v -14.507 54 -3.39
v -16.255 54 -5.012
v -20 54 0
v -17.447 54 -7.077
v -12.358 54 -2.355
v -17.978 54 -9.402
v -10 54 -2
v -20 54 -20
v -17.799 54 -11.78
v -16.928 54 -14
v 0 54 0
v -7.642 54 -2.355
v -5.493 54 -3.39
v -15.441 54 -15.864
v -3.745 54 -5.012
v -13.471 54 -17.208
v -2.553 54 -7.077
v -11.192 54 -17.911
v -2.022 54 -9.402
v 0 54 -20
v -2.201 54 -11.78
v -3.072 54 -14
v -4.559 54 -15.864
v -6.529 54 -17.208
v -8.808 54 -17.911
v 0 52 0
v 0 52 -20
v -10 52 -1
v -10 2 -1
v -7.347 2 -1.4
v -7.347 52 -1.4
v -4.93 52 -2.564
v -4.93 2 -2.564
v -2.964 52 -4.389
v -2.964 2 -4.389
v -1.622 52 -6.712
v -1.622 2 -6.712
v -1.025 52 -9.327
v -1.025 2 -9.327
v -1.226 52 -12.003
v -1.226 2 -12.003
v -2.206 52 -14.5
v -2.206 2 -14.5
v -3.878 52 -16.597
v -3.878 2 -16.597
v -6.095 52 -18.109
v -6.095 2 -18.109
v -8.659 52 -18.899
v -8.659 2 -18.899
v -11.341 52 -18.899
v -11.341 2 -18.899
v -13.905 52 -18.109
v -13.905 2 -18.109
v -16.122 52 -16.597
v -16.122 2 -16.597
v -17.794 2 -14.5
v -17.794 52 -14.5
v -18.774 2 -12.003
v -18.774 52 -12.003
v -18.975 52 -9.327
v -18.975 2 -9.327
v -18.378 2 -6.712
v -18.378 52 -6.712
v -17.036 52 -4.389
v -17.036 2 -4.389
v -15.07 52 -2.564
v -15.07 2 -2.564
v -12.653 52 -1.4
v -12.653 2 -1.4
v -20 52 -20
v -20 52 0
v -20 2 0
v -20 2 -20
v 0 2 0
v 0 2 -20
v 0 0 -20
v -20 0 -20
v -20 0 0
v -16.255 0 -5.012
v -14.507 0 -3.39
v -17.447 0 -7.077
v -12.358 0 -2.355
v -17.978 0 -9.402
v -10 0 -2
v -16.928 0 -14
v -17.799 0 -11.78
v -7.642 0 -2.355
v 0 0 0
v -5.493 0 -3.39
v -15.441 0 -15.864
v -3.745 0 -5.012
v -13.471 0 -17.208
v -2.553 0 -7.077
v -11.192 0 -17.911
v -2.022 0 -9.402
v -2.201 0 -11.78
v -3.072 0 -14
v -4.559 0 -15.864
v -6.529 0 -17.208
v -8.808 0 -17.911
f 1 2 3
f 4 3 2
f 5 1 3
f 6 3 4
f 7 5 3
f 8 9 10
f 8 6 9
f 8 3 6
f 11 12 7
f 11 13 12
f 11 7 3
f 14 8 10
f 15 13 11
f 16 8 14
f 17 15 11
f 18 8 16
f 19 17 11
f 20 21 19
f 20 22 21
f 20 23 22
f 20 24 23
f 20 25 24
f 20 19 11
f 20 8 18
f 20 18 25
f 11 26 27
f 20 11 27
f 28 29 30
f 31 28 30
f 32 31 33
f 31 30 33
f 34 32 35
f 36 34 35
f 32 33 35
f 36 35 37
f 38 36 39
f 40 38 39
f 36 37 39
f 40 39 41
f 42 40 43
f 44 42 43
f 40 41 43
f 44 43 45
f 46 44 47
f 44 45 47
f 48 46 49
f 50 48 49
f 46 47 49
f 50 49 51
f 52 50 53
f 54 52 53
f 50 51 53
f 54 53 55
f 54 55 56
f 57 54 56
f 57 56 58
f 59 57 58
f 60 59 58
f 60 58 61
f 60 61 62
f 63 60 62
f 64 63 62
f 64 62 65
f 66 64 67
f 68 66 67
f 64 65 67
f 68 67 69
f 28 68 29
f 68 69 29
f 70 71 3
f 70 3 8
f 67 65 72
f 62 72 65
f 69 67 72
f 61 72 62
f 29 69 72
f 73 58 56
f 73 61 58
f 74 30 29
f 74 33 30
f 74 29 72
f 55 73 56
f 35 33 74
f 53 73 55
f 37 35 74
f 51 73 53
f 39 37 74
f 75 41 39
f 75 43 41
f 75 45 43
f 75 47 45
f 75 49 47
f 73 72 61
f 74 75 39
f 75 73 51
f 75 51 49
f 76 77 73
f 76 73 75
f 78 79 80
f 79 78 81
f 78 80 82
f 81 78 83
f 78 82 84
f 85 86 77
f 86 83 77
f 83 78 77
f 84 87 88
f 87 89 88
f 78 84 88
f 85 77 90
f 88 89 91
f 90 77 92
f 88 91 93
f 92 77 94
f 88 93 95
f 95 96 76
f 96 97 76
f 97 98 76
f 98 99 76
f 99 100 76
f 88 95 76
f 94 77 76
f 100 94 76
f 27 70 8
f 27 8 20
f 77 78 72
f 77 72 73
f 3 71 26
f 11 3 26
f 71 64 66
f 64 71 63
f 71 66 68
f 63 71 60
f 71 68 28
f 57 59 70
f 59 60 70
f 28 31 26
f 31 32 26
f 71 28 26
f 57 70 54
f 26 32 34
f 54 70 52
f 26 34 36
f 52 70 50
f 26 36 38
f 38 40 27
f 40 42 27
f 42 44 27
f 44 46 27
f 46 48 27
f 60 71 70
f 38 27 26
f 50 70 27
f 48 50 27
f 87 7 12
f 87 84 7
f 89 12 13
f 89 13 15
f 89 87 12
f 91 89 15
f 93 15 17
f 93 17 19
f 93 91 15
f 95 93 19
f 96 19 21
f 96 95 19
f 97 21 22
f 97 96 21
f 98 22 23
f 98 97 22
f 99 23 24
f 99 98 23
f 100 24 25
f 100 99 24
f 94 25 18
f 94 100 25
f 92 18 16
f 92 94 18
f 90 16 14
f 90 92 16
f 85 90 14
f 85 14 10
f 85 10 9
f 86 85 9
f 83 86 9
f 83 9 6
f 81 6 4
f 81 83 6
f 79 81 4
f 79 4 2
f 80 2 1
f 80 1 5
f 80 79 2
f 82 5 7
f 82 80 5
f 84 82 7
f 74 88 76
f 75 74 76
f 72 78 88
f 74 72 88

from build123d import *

# Parameters (mm, degrees)
SKETCH1_W           = 20
SKETCH1_H           = 20
SKETCH1_R           = 8
BOSS_EXTRUDE1_DEPTH = 2
SKETCH2_R           = 9
SKETCH2_R_2         = 8
BOSS_EXTRUDE3_DEPTH = 50
SKETCH3_W           = 20
SKETCH3_H           = 20
SKETCH3_R           = 8
BOSS_EXTRUDE5_DEPTH = 2


with BuildPart() as part:
    # Sketch1 → Boss-Extrude1 (new body)
    with BuildSketch(Plane(origin=(0, 0, 0), x_dir=(1, 0, 0), z_dir=(0, 1, 0))):
        with Locations((-10, 10)):
            Rectangle(SKETCH1_W, SKETCH1_H)
        with Locations(Location((-10, 10, 0), (0, 0, 270))):
            Circle(SKETCH1_R, mode=Mode.SUBTRACT)
    extrude(amount=BOSS_EXTRUDE1_DEPTH)

    # Sketch2 → Boss-Extrude3 (add)
    with BuildSketch(Plane(origin=(0, 2, 0), x_dir=(1, 0, 0), z_dir=(0, 1, 0))):
        with Locations(Location((-10, 10, 0), (0, 0, 270))):
            Circle(SKETCH2_R)
        with Locations(Location((-10, 10, 0), (0, 0, 270))):
            Circle(SKETCH2_R_2, mode=Mode.SUBTRACT)
    extrude(amount=BOSS_EXTRUDE3_DEPTH)

    # Sketch3 → Boss-Extrude5 (add)
    with BuildSketch(Plane(origin=(0, 52, 0), x_dir=(1, 0, 0), z_dir=(0, 1, 0))):
        with Locations((-10, 10)):
            Rectangle(SKETCH3_W, SKETCH3_H)
        with Locations(Location((-10, 10, 0), (0, 0, 270))):
            Circle(SKETCH3_R, mode=Mode.SUBTRACT)
    extrude(amount=BOSS_EXTRUDE5_DEPTH)


solid = part.part
